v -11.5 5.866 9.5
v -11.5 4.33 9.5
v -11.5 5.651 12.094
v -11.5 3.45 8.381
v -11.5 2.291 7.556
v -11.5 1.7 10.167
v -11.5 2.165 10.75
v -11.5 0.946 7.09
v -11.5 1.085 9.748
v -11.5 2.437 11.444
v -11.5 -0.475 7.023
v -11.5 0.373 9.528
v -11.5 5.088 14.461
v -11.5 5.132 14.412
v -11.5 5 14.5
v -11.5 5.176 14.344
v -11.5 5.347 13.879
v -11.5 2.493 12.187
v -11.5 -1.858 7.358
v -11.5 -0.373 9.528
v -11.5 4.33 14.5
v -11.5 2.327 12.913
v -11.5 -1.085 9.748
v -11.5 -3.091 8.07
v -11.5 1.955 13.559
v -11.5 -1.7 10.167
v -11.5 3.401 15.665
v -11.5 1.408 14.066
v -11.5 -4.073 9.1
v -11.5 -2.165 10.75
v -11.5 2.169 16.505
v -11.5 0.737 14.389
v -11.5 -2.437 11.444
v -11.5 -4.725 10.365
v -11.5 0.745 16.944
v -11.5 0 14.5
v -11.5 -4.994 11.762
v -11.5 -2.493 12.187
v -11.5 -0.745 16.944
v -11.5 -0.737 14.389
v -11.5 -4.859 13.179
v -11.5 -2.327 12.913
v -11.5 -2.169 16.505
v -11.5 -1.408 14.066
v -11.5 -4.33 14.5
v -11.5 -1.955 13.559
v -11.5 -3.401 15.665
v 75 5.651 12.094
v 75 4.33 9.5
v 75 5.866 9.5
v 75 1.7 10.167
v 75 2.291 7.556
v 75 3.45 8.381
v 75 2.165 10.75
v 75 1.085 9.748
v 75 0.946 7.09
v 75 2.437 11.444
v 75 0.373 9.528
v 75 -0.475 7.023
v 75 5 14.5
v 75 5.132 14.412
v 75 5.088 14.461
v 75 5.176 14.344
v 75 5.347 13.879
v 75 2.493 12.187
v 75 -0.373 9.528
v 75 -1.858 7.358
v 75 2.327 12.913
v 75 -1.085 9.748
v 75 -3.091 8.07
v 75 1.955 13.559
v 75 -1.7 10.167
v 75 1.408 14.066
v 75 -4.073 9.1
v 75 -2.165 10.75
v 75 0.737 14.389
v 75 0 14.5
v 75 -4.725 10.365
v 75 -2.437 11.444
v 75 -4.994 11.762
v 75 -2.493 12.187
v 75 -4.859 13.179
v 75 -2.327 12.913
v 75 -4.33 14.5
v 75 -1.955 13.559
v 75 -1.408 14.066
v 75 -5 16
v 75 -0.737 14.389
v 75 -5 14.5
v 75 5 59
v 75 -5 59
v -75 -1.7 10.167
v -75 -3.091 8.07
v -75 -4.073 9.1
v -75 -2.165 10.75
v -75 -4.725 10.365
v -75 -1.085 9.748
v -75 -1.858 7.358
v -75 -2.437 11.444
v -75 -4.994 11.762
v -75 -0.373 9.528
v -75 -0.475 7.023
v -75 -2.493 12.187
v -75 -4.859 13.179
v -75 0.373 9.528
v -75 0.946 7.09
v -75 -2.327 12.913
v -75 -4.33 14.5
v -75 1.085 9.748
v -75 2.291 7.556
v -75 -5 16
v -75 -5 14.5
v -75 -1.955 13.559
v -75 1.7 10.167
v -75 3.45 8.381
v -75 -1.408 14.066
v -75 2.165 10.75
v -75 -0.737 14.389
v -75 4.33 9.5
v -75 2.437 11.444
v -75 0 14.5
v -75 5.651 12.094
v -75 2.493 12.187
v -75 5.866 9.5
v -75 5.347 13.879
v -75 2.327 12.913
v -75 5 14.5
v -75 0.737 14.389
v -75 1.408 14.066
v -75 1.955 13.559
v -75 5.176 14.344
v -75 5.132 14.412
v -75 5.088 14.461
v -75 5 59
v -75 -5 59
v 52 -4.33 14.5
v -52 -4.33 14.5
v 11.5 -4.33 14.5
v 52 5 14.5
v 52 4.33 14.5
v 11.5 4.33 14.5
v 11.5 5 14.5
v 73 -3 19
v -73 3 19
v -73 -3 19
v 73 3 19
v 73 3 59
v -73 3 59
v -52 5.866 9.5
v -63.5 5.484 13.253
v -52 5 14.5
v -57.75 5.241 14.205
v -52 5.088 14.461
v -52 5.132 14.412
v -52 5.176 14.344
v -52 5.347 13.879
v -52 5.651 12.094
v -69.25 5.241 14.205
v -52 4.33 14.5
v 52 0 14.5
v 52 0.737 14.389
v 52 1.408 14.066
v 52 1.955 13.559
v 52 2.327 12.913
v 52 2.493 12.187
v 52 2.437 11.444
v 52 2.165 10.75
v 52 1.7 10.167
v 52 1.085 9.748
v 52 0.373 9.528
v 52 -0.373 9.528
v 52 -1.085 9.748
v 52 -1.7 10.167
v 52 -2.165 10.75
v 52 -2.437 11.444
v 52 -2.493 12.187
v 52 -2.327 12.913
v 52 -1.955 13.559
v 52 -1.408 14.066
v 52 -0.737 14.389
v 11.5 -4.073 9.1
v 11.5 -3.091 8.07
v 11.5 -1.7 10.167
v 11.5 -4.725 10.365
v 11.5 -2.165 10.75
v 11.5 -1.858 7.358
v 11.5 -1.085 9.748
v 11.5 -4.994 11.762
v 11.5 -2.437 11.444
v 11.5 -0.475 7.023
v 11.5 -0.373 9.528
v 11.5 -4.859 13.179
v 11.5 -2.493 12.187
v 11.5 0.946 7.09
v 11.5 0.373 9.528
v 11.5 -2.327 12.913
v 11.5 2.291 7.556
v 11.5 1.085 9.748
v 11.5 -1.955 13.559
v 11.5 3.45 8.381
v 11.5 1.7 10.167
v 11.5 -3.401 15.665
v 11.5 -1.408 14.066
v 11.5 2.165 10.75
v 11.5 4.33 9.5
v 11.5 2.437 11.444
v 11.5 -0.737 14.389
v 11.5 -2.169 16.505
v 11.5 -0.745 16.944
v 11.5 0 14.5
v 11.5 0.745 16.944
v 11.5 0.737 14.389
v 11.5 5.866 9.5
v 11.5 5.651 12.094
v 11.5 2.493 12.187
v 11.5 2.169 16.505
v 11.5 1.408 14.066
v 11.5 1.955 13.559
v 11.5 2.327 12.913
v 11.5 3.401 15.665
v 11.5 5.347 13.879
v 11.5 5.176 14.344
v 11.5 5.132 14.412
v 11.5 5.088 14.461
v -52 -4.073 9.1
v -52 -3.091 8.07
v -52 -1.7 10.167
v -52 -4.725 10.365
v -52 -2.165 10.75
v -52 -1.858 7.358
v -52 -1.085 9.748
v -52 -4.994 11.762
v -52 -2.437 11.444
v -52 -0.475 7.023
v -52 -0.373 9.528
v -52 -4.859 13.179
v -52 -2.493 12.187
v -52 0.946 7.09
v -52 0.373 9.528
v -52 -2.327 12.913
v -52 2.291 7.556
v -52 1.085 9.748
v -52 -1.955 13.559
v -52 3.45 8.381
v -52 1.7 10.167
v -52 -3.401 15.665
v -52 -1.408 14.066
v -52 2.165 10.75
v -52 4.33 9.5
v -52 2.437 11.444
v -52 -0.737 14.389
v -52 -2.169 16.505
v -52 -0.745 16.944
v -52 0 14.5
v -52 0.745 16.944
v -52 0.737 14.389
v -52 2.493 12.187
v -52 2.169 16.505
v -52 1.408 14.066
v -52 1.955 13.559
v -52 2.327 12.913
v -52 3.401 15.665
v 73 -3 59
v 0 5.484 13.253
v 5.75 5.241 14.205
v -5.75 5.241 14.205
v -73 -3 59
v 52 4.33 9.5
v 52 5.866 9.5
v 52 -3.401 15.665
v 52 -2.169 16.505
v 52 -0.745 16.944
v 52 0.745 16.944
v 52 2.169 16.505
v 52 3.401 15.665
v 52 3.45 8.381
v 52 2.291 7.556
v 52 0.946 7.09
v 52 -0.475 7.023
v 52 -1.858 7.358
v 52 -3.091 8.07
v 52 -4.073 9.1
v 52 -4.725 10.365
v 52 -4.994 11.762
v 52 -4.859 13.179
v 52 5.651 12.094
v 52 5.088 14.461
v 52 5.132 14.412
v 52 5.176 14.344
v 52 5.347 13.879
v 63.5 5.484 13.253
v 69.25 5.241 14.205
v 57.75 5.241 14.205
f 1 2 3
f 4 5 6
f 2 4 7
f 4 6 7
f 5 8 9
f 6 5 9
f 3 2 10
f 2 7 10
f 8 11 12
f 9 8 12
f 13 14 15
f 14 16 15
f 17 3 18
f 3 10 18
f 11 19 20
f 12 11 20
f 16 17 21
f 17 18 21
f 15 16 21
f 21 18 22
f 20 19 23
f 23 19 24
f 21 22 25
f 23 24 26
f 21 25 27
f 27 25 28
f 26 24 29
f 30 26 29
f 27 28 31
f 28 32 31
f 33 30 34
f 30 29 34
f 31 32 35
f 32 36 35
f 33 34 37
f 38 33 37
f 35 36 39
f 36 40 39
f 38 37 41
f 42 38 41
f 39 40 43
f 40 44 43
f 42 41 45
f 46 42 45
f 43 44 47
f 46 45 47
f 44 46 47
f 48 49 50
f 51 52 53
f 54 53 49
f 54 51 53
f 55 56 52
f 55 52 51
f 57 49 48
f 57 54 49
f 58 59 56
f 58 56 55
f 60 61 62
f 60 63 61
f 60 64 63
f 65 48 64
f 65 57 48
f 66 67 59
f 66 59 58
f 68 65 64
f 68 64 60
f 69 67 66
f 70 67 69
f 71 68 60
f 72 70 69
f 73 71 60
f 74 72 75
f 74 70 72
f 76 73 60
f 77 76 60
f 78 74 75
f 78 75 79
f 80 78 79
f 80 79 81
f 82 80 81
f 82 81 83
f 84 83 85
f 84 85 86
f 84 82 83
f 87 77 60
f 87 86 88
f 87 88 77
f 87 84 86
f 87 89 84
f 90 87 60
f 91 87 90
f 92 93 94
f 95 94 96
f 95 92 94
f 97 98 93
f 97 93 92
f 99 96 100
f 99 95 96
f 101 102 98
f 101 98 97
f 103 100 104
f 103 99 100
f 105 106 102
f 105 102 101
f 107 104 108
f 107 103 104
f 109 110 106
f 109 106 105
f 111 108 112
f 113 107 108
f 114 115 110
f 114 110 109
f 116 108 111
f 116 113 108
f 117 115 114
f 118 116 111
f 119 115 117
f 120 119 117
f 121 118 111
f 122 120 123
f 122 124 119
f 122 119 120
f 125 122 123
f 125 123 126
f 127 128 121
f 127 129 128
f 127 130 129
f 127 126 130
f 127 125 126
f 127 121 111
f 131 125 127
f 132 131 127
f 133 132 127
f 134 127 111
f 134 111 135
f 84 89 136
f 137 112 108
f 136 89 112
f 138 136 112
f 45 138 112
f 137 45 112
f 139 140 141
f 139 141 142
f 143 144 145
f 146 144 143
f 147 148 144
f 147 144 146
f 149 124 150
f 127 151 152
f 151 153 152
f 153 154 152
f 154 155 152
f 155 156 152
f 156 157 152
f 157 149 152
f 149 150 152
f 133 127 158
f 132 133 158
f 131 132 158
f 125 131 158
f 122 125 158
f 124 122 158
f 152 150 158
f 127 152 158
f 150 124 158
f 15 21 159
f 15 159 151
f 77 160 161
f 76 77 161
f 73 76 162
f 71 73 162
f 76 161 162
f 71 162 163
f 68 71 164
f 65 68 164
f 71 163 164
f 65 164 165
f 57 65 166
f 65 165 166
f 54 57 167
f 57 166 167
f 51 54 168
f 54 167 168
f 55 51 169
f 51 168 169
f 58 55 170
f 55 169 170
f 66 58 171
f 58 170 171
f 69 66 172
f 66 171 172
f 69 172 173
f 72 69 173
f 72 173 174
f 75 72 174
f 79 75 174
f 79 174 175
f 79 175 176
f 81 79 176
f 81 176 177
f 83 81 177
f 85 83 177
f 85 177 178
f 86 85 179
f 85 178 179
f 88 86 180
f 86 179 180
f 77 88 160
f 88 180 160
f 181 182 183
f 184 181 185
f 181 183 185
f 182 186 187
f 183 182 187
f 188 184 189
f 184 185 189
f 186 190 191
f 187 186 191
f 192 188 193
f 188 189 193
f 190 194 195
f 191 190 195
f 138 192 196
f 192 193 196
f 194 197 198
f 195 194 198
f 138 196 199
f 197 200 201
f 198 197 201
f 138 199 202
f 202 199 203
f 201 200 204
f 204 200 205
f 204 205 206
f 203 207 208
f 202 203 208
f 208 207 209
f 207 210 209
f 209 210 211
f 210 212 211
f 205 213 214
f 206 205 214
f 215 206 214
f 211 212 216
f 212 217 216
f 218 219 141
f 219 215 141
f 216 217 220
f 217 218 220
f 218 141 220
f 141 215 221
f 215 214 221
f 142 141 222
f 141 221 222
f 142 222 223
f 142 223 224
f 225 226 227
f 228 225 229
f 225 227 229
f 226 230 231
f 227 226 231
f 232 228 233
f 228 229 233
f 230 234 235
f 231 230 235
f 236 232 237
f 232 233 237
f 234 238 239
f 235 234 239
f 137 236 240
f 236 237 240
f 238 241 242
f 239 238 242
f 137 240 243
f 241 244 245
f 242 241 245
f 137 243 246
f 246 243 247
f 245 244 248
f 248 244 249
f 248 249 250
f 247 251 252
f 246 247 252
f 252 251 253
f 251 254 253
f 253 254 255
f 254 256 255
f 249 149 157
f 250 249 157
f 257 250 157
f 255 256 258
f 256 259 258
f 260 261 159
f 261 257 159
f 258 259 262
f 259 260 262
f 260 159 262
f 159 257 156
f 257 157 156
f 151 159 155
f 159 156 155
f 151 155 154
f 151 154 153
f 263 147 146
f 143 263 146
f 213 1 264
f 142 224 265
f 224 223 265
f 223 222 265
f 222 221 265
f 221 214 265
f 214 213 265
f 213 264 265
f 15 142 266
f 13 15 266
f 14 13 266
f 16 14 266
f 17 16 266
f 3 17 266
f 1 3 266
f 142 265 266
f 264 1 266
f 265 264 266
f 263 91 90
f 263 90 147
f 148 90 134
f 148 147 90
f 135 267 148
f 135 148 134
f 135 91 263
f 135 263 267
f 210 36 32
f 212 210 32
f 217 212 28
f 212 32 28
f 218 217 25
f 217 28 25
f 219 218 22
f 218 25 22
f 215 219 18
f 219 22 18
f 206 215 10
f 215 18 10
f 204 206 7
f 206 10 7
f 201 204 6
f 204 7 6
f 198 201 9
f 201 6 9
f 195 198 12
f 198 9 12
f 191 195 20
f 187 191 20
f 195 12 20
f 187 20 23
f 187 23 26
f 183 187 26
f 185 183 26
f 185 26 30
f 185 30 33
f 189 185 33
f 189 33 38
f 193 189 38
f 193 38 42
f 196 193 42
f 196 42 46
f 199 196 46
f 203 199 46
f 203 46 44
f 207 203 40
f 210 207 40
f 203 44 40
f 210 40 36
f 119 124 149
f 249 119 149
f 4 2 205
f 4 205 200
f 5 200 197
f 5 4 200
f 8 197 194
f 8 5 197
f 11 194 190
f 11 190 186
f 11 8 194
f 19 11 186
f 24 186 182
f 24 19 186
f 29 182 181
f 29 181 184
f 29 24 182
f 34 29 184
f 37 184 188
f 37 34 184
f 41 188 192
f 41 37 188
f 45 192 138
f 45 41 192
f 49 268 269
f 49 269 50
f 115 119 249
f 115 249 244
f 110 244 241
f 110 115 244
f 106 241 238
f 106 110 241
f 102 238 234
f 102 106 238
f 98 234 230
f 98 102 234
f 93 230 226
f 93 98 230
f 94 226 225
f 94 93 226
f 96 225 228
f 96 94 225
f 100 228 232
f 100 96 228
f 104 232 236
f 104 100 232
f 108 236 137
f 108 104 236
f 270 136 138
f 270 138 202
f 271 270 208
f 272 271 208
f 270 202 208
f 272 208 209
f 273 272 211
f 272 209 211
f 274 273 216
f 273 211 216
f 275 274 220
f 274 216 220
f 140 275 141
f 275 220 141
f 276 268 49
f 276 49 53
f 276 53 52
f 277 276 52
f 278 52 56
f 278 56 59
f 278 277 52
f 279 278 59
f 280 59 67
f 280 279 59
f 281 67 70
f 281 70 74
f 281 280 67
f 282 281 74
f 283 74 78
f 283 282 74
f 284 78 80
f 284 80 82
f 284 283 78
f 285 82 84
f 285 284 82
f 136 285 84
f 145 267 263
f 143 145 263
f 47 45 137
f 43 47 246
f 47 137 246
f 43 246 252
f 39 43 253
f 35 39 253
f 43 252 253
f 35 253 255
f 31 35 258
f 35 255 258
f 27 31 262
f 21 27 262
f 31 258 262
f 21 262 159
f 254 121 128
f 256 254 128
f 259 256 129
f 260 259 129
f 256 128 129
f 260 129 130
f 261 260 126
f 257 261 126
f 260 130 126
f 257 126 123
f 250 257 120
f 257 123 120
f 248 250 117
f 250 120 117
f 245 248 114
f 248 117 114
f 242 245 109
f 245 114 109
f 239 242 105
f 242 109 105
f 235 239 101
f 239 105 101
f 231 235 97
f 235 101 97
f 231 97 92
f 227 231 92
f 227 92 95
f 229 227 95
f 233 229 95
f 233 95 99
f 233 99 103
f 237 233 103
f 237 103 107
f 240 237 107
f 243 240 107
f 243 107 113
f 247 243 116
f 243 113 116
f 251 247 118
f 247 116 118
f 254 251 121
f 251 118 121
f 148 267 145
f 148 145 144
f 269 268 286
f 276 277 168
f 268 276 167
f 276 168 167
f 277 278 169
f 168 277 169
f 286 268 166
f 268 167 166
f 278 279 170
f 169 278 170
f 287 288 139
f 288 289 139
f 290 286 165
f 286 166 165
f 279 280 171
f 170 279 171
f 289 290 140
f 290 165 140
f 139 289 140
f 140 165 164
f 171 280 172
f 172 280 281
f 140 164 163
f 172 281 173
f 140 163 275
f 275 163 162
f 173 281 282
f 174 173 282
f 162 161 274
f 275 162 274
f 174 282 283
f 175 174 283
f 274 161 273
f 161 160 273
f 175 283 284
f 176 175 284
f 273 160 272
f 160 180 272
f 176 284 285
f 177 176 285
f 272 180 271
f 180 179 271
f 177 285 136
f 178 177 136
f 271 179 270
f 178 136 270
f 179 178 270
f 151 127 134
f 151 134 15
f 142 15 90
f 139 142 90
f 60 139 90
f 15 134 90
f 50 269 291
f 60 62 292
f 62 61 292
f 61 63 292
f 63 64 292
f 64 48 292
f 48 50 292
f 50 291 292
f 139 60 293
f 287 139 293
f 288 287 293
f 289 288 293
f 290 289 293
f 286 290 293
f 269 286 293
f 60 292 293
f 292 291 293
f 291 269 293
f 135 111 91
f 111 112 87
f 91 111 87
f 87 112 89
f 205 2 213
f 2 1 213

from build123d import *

# Parameters (mm, degrees)
BOSS_EXTRUDE1_DEPTH             = 1
BOSS_EXTRUDE5_DEPTH             = 100
BOSS_EXTRUDE5_DEPTH_BACK        = 1
SKETCH2_W                       = 214
SKETCH2_H                       = 10
FILLET3_SIZE                    = 15
FILLET3_SIZE_2                  = 10
CUT_EXTRUDE2_DEPTH              = 229
SKETCH7_W                       = 64
SKETCH7_H                       = 10
CUT_EXTRUDE3_DEPTH              = 14
SKETCH11_R                      = 5
SKETCH11_R_2                    = 2.5
EXTRUDE_THIN4_DEPTH             = 23
EXTRUDE_THIN5_START             = -63.5
SKETCH11_2_R                    = 5
SKETCH11_2_R_2                  = 2.5
EXTRUDE_THIN5_DEPTH             = 23
EXTRUDE_THIN6_START             = -127
SKETCH11_3_R                    = 5
SKETCH11_3_R_2                  = 2.5
EXTRUDE_THIN6_DEPTH             = 23
SKETCH12_W                      = 210
SKETCH12_H                      = 6
CUT_EXTRUDE4_DEPTH              = 82
CUT_EXTRUDE5_DEPTH              = 180
SKETCH14_W                      = 83.209760426
SKETCH14_H                      = 10
BOSS_EXTRUDE6_DEPTH             = 2
SKETCH15_W                      = 1.646756057
SKETCH15_H                      = 0.570147936
SKETCH15_W_2                    = 1.681570062
SKETCH15_H_2                    = 0.299582691
CUT_EXTRUDE6_DEPTH              = 182
SKETCH16_W                      = 150
SKETCH16_H                      = 42
CUT_EXTRUDE7_DEPTH              = 182
BOSS_EXTRUDE7_REACH             = 107.948
BOSS_EXTRUDE7_END_RADIUS        = 5
BOSS_EXTRUDE7_START             = -10
SKETCH17_W                      = 23
SKETCH17_H                      = 5
BOSS_EXTRUDE7_DIRECTION_2_DEPTH = 1
FILLET5_SIZE                    = 10
FILLET5_SIZE_2                  = 1


with BuildPart() as part:
    # Sketch1 → Boss-Extrude1 (new body)
    with BuildSketch(Plane.XY):
        Polygon((75, 50), (75, -50), (-75, -30), (-75, 30), align=None)
    extrude(amount=BOSS_EXTRUDE1_DEPTH)

    # Sketch2 → Boss-Extrude5 (add, two sides: drawn at the far end of the back side and taken through both)
    with BuildSketch(Plane.XY.offset(1).offset(-BOSS_EXTRUDE5_DEPTH_BACK)):
        with Locations((32, 0)):
            Rectangle(SKETCH2_W, SKETCH2_H)
    extrude(amount=BOSS_EXTRUDE5_DEPTH + BOSS_EXTRUDE5_DEPTH_BACK)

    # Fillet3
    # an asymmetric fillet: 15, 10 mm, written as the material it adds along each edge
    with BuildSketch(Plane(origin=(75, -5, 1), x_dir=(0, 0, 1), z_dir=(-1, 0, 0))) as fillet3_piece_1:
        with BuildLine():
            Bezier((FILLET3_SIZE, 0), (0, 0), (0, -FILLET3_SIZE_2), weights=[1, 0.707106781, 1])
            Line((0, -FILLET3_SIZE_2), (0, 0))
            Line((0, 0), (FILLET3_SIZE, 0))
        make_face()
    extrude(amount=150)
    with BuildSketch(Plane(origin=(-75, 5, 1), x_dir=(0, 1, 0), z_dir=(1, 0, 0))) as fillet3_piece_2:
        with BuildLine():
            Bezier((FILLET3_SIZE_2, 0), (0, 0), (0, FILLET3_SIZE), weights=[1, 0.707106781, 1])
            Line((0, FILLET3_SIZE), (0, 0))
            Line((0, 0), (FILLET3_SIZE_2, 0))
        make_face()
    extrude(amount=150)

    # Sketch6 → Cut-Extrude2 (cut)
    with BuildSketch(Plane.ZY.offset(75)):
        with BuildLine():
            Line((9.5, 6.986773712), (9.5, 4.330127019))
            ThreePointArc((9.5, 4.330127019), (7, 0), (9.5, -4.330127019))
            Line((9.5, -4.330127019), (9.5, -7.297871365))
            Line((9.5, -7.297871365), (14.5, -7.297871365))
            Line((14.5, -7.297871365), (14.5, -4.330127019))
            ThreePointArc((14.5, -4.330127019), (17, 0), (14.5, 4.330127019))
            Line((14.5, 4.330127019), (14.5, 6.986773712))
            Line((14.5, 6.986773712), (9.5, 6.986773712))
        make_face()
    extrude(amount=-CUT_EXTRUDE2_DEPTH, mode=Mode.SUBTRACT)


with BuildPart() as cut_extrude2_piece_1:
    # of the separate pieces the step leaves, piece 1, a body of its own (cut_extrude2_pieces)
    add(part.part.solids().sort_by_distance((-75, 5.050125629, 14.5))[0])

    # Sketch11 → Extrude-Thin4 (add)
    with BuildSketch(Plane.ZY.offset(75)):
        with Locations((12, 0)):
            Circle(SKETCH11_R)
        with Locations((12, 0)):
            Circle(SKETCH11_R_2, mode=Mode.SUBTRACT)
    extrude(amount=-EXTRUDE_THIN4_DEPTH)

    # Sketch11<2> → Extrude-Thin5 (add)
    with BuildSketch(Plane.ZY.offset(75).offset(EXTRUDE_THIN5_START)):
        with Locations((12, 0)):
            Circle(SKETCH11_2_R)
        with Locations((12, 0)):
            Circle(SKETCH11_2_R_2, mode=Mode.SUBTRACT)
    extrude(amount=-EXTRUDE_THIN5_DEPTH)

    # Sketch11<3> → Extrude-Thin6 (add)
    with BuildSketch(Plane.ZY.offset(75).offset(EXTRUDE_THIN6_START)):
        with Locations((12, 0)):
            Circle(SKETCH11_3_R)
        with Locations((12, 0)):
            Circle(SKETCH11_3_R_2, mode=Mode.SUBTRACT)
    extrude(amount=-EXTRUDE_THIN6_DEPTH)

    # Sketch12 → Cut-Extrude4 (cut)
    with BuildSketch(Plane.XY.offset(101)):
        with Locations((32, 0)):
            Rectangle(SKETCH12_W, SKETCH12_H)
    extrude(amount=-CUT_EXTRUDE4_DEPTH, mode=Mode.SUBTRACT)

    # Sketch13 → Cut-Extrude5 (cut)
    with BuildSketch(Plane.XY):
        Polygon((75, 14.806657355), (75, -17.321011219), (144.128197091, -17.321011219), (144.128197091, 20.114706945), (75, 18.438480759), align=None)
    extrude(amount=CUT_EXTRUDE5_DEPTH, mode=Mode.SUBTRACT)

    # Sketch14 → Boss-Extrude6 (add)
    with BuildSketch(Plane(origin=(75, 0, 0), x_dir=(0, 0, -1), z_dir=(1, 0, 0))):
        with Locations((-59.395119787, 0)):
            Rectangle(SKETCH14_W, SKETCH14_H)
    extrude(amount=-BOSS_EXTRUDE6_DEPTH)

    # Sketch15 → Cut-Extrude6 (cut)
    with BuildSketch(Plane(origin=(75, 0, 0), x_dir=(0, 0, -1), z_dir=(1, 0, 0))):
        with Locations((-15.176621972, 5.285073968)):
            Rectangle(SKETCH15_W, SKETCH15_H)
        with Locations((-15.159214969, -5.149791346)):
            Rectangle(SKETCH15_W_2, SKETCH15_H_2)
    extrude(amount=-CUT_EXTRUDE6_DEPTH, mode=Mode.SUBTRACT)

    # Sketch16 → Cut-Extrude7 (cut)
    with BuildSketch(Plane(origin=(0, -5, 0), x_dir=(-1, 0, 0), z_dir=(0, -1, 0))):
        with Locations((0, -80)):
            Rectangle(SKETCH16_W, SKETCH16_H)
    extrude(amount=-CUT_EXTRUDE7_DEPTH, mode=Mode.SUBTRACT)

    # Boss-Extrude7: up to this cylinder (the profile starts outside it)
    boss_extrude7_end = Plane(origin=(0, 0, 12), z_dir=(-1, 0, 0)) * Cylinder(BOSS_EXTRUDE7_END_RADIUS, 353.896, mode=Mode.PRIVATE)
    # Sketch17 → Boss-Extrude7 (add, up to the surface)
    with BuildSketch(Plane.XZ.offset(5).offset(BOSS_EXTRUDE7_START), mode=Mode.PRIVATE) as boss_extrude7_sk1:
        with Locations((63.5, 12)):
            Rectangle(SKETCH17_W, SKETCH17_H)
    boss_extrude7_tool1 = extrude(boss_extrude7_sk1.sketch, amount=BOSS_EXTRUDE7_REACH, mode=Mode.PRIVATE) - boss_extrude7_end
    add(boss_extrude7_tool1.solids().sort_by_distance((63.5, 5, 12))[0])
    add(boss_extrude7_tool1.solids().sort_by_distance((63.5, 5, 12))[1])
    # Sketch17 → Boss-Extrude7 (add, up to the surface)
    with BuildSketch(Plane.XZ.offset(5).offset(BOSS_EXTRUDE7_START), mode=Mode.PRIVATE) as boss_extrude7_sk2:
        with Locations((0, 12)):
            Rectangle(SKETCH17_W, SKETCH17_H)
    boss_extrude7_tool2 = extrude(boss_extrude7_sk2.sketch, amount=BOSS_EXTRUDE7_REACH, mode=Mode.PRIVATE) - boss_extrude7_end
    add(boss_extrude7_tool2.solids().sort_by_distance((0, 5, 12))[0])
    add(boss_extrude7_tool2.solids().sort_by_distance((0, 5, 12))[1])
    # Sketch17 → Boss-Extrude7 (add, up to the surface)
    with BuildSketch(Plane.XZ.offset(5).offset(BOSS_EXTRUDE7_START), mode=Mode.PRIVATE) as boss_extrude7_sk3:
        with Locations((-63.5, 12)):
            Rectangle(SKETCH17_W, SKETCH17_H)
    boss_extrude7_tool3 = extrude(boss_extrude7_sk3.sketch, amount=BOSS_EXTRUDE7_REACH, mode=Mode.PRIVATE) - boss_extrude7_end
    add(boss_extrude7_tool3.solids().sort_by_distance((-63.5, 5, 12))[0])
    add(boss_extrude7_tool3.solids().sort_by_distance((-63.5, 5, 12))[1])

    # Sketch17 → Boss-Extrude7 direction 2 (add)
    with BuildSketch(Plane.XZ.offset(5).offset(BOSS_EXTRUDE7_START)):
        with Locations((63.5, 12)):
            Rectangle(SKETCH17_W, SKETCH17_H)
        with Locations((0, 12)):
            Rectangle(SKETCH17_W, SKETCH17_H)
        with Locations((-63.5, 12)):
            Rectangle(SKETCH17_W, SKETCH17_H)
    extrude(amount=-BOSS_EXTRUDE7_DIRECTION_2_DEPTH)

    # Fillet5
    # an asymmetric fillet: 10, 1 mm, written as the material it takes off along each edge
    with BuildSketch(Plane(origin=(-100, 6, 14.5), x_dir=(0, 0, -1), z_dir=(1, 0, 0)), Plane(origin=(-36.5, 6, 14.5), x_dir=(0, 0, -1), z_dir=(1, 0, 0)), Plane(origin=(27, 6, 14.5), x_dir=(0, 0, -1), z_dir=(1, 0, 0))) as fillet5_piece_1:
        with BuildLine():
            Bezier((FILLET5_SIZE, 0), (0, 0), (0, -FILLET5_SIZE_2), weights=[1, 0.707106781, 1])
            Line((0, -FILLET5_SIZE_2), (0, 0))
            Line((0, 0), (FILLET5_SIZE, 0))
        make_face()
    extrude(amount=73, mode=Mode.SUBTRACT)


with BuildPart() as cut_extrude2_piece_2:
    # of the separate pieces the step leaves, piece 2, a body of its own (cut_extrude2_pieces)
    add(part.part.solids().sort_by_distance((-75, 15, 1))[0])

    # Sketch7 → Cut-Extrude3 (cut)
    with BuildSketch(Plane(origin=(0, 0, 0), x_dir=(-1, 0, 0), z_dir=(0, 0, -1))):
        with Locations((-107, 0)):
            Rectangle(SKETCH7_W, SKETCH7_H)
    extrude(amount=-CUT_EXTRUDE3_DEPTH, mode=Mode.SUBTRACT)


solid = cut_extrude2_piece_1.part
